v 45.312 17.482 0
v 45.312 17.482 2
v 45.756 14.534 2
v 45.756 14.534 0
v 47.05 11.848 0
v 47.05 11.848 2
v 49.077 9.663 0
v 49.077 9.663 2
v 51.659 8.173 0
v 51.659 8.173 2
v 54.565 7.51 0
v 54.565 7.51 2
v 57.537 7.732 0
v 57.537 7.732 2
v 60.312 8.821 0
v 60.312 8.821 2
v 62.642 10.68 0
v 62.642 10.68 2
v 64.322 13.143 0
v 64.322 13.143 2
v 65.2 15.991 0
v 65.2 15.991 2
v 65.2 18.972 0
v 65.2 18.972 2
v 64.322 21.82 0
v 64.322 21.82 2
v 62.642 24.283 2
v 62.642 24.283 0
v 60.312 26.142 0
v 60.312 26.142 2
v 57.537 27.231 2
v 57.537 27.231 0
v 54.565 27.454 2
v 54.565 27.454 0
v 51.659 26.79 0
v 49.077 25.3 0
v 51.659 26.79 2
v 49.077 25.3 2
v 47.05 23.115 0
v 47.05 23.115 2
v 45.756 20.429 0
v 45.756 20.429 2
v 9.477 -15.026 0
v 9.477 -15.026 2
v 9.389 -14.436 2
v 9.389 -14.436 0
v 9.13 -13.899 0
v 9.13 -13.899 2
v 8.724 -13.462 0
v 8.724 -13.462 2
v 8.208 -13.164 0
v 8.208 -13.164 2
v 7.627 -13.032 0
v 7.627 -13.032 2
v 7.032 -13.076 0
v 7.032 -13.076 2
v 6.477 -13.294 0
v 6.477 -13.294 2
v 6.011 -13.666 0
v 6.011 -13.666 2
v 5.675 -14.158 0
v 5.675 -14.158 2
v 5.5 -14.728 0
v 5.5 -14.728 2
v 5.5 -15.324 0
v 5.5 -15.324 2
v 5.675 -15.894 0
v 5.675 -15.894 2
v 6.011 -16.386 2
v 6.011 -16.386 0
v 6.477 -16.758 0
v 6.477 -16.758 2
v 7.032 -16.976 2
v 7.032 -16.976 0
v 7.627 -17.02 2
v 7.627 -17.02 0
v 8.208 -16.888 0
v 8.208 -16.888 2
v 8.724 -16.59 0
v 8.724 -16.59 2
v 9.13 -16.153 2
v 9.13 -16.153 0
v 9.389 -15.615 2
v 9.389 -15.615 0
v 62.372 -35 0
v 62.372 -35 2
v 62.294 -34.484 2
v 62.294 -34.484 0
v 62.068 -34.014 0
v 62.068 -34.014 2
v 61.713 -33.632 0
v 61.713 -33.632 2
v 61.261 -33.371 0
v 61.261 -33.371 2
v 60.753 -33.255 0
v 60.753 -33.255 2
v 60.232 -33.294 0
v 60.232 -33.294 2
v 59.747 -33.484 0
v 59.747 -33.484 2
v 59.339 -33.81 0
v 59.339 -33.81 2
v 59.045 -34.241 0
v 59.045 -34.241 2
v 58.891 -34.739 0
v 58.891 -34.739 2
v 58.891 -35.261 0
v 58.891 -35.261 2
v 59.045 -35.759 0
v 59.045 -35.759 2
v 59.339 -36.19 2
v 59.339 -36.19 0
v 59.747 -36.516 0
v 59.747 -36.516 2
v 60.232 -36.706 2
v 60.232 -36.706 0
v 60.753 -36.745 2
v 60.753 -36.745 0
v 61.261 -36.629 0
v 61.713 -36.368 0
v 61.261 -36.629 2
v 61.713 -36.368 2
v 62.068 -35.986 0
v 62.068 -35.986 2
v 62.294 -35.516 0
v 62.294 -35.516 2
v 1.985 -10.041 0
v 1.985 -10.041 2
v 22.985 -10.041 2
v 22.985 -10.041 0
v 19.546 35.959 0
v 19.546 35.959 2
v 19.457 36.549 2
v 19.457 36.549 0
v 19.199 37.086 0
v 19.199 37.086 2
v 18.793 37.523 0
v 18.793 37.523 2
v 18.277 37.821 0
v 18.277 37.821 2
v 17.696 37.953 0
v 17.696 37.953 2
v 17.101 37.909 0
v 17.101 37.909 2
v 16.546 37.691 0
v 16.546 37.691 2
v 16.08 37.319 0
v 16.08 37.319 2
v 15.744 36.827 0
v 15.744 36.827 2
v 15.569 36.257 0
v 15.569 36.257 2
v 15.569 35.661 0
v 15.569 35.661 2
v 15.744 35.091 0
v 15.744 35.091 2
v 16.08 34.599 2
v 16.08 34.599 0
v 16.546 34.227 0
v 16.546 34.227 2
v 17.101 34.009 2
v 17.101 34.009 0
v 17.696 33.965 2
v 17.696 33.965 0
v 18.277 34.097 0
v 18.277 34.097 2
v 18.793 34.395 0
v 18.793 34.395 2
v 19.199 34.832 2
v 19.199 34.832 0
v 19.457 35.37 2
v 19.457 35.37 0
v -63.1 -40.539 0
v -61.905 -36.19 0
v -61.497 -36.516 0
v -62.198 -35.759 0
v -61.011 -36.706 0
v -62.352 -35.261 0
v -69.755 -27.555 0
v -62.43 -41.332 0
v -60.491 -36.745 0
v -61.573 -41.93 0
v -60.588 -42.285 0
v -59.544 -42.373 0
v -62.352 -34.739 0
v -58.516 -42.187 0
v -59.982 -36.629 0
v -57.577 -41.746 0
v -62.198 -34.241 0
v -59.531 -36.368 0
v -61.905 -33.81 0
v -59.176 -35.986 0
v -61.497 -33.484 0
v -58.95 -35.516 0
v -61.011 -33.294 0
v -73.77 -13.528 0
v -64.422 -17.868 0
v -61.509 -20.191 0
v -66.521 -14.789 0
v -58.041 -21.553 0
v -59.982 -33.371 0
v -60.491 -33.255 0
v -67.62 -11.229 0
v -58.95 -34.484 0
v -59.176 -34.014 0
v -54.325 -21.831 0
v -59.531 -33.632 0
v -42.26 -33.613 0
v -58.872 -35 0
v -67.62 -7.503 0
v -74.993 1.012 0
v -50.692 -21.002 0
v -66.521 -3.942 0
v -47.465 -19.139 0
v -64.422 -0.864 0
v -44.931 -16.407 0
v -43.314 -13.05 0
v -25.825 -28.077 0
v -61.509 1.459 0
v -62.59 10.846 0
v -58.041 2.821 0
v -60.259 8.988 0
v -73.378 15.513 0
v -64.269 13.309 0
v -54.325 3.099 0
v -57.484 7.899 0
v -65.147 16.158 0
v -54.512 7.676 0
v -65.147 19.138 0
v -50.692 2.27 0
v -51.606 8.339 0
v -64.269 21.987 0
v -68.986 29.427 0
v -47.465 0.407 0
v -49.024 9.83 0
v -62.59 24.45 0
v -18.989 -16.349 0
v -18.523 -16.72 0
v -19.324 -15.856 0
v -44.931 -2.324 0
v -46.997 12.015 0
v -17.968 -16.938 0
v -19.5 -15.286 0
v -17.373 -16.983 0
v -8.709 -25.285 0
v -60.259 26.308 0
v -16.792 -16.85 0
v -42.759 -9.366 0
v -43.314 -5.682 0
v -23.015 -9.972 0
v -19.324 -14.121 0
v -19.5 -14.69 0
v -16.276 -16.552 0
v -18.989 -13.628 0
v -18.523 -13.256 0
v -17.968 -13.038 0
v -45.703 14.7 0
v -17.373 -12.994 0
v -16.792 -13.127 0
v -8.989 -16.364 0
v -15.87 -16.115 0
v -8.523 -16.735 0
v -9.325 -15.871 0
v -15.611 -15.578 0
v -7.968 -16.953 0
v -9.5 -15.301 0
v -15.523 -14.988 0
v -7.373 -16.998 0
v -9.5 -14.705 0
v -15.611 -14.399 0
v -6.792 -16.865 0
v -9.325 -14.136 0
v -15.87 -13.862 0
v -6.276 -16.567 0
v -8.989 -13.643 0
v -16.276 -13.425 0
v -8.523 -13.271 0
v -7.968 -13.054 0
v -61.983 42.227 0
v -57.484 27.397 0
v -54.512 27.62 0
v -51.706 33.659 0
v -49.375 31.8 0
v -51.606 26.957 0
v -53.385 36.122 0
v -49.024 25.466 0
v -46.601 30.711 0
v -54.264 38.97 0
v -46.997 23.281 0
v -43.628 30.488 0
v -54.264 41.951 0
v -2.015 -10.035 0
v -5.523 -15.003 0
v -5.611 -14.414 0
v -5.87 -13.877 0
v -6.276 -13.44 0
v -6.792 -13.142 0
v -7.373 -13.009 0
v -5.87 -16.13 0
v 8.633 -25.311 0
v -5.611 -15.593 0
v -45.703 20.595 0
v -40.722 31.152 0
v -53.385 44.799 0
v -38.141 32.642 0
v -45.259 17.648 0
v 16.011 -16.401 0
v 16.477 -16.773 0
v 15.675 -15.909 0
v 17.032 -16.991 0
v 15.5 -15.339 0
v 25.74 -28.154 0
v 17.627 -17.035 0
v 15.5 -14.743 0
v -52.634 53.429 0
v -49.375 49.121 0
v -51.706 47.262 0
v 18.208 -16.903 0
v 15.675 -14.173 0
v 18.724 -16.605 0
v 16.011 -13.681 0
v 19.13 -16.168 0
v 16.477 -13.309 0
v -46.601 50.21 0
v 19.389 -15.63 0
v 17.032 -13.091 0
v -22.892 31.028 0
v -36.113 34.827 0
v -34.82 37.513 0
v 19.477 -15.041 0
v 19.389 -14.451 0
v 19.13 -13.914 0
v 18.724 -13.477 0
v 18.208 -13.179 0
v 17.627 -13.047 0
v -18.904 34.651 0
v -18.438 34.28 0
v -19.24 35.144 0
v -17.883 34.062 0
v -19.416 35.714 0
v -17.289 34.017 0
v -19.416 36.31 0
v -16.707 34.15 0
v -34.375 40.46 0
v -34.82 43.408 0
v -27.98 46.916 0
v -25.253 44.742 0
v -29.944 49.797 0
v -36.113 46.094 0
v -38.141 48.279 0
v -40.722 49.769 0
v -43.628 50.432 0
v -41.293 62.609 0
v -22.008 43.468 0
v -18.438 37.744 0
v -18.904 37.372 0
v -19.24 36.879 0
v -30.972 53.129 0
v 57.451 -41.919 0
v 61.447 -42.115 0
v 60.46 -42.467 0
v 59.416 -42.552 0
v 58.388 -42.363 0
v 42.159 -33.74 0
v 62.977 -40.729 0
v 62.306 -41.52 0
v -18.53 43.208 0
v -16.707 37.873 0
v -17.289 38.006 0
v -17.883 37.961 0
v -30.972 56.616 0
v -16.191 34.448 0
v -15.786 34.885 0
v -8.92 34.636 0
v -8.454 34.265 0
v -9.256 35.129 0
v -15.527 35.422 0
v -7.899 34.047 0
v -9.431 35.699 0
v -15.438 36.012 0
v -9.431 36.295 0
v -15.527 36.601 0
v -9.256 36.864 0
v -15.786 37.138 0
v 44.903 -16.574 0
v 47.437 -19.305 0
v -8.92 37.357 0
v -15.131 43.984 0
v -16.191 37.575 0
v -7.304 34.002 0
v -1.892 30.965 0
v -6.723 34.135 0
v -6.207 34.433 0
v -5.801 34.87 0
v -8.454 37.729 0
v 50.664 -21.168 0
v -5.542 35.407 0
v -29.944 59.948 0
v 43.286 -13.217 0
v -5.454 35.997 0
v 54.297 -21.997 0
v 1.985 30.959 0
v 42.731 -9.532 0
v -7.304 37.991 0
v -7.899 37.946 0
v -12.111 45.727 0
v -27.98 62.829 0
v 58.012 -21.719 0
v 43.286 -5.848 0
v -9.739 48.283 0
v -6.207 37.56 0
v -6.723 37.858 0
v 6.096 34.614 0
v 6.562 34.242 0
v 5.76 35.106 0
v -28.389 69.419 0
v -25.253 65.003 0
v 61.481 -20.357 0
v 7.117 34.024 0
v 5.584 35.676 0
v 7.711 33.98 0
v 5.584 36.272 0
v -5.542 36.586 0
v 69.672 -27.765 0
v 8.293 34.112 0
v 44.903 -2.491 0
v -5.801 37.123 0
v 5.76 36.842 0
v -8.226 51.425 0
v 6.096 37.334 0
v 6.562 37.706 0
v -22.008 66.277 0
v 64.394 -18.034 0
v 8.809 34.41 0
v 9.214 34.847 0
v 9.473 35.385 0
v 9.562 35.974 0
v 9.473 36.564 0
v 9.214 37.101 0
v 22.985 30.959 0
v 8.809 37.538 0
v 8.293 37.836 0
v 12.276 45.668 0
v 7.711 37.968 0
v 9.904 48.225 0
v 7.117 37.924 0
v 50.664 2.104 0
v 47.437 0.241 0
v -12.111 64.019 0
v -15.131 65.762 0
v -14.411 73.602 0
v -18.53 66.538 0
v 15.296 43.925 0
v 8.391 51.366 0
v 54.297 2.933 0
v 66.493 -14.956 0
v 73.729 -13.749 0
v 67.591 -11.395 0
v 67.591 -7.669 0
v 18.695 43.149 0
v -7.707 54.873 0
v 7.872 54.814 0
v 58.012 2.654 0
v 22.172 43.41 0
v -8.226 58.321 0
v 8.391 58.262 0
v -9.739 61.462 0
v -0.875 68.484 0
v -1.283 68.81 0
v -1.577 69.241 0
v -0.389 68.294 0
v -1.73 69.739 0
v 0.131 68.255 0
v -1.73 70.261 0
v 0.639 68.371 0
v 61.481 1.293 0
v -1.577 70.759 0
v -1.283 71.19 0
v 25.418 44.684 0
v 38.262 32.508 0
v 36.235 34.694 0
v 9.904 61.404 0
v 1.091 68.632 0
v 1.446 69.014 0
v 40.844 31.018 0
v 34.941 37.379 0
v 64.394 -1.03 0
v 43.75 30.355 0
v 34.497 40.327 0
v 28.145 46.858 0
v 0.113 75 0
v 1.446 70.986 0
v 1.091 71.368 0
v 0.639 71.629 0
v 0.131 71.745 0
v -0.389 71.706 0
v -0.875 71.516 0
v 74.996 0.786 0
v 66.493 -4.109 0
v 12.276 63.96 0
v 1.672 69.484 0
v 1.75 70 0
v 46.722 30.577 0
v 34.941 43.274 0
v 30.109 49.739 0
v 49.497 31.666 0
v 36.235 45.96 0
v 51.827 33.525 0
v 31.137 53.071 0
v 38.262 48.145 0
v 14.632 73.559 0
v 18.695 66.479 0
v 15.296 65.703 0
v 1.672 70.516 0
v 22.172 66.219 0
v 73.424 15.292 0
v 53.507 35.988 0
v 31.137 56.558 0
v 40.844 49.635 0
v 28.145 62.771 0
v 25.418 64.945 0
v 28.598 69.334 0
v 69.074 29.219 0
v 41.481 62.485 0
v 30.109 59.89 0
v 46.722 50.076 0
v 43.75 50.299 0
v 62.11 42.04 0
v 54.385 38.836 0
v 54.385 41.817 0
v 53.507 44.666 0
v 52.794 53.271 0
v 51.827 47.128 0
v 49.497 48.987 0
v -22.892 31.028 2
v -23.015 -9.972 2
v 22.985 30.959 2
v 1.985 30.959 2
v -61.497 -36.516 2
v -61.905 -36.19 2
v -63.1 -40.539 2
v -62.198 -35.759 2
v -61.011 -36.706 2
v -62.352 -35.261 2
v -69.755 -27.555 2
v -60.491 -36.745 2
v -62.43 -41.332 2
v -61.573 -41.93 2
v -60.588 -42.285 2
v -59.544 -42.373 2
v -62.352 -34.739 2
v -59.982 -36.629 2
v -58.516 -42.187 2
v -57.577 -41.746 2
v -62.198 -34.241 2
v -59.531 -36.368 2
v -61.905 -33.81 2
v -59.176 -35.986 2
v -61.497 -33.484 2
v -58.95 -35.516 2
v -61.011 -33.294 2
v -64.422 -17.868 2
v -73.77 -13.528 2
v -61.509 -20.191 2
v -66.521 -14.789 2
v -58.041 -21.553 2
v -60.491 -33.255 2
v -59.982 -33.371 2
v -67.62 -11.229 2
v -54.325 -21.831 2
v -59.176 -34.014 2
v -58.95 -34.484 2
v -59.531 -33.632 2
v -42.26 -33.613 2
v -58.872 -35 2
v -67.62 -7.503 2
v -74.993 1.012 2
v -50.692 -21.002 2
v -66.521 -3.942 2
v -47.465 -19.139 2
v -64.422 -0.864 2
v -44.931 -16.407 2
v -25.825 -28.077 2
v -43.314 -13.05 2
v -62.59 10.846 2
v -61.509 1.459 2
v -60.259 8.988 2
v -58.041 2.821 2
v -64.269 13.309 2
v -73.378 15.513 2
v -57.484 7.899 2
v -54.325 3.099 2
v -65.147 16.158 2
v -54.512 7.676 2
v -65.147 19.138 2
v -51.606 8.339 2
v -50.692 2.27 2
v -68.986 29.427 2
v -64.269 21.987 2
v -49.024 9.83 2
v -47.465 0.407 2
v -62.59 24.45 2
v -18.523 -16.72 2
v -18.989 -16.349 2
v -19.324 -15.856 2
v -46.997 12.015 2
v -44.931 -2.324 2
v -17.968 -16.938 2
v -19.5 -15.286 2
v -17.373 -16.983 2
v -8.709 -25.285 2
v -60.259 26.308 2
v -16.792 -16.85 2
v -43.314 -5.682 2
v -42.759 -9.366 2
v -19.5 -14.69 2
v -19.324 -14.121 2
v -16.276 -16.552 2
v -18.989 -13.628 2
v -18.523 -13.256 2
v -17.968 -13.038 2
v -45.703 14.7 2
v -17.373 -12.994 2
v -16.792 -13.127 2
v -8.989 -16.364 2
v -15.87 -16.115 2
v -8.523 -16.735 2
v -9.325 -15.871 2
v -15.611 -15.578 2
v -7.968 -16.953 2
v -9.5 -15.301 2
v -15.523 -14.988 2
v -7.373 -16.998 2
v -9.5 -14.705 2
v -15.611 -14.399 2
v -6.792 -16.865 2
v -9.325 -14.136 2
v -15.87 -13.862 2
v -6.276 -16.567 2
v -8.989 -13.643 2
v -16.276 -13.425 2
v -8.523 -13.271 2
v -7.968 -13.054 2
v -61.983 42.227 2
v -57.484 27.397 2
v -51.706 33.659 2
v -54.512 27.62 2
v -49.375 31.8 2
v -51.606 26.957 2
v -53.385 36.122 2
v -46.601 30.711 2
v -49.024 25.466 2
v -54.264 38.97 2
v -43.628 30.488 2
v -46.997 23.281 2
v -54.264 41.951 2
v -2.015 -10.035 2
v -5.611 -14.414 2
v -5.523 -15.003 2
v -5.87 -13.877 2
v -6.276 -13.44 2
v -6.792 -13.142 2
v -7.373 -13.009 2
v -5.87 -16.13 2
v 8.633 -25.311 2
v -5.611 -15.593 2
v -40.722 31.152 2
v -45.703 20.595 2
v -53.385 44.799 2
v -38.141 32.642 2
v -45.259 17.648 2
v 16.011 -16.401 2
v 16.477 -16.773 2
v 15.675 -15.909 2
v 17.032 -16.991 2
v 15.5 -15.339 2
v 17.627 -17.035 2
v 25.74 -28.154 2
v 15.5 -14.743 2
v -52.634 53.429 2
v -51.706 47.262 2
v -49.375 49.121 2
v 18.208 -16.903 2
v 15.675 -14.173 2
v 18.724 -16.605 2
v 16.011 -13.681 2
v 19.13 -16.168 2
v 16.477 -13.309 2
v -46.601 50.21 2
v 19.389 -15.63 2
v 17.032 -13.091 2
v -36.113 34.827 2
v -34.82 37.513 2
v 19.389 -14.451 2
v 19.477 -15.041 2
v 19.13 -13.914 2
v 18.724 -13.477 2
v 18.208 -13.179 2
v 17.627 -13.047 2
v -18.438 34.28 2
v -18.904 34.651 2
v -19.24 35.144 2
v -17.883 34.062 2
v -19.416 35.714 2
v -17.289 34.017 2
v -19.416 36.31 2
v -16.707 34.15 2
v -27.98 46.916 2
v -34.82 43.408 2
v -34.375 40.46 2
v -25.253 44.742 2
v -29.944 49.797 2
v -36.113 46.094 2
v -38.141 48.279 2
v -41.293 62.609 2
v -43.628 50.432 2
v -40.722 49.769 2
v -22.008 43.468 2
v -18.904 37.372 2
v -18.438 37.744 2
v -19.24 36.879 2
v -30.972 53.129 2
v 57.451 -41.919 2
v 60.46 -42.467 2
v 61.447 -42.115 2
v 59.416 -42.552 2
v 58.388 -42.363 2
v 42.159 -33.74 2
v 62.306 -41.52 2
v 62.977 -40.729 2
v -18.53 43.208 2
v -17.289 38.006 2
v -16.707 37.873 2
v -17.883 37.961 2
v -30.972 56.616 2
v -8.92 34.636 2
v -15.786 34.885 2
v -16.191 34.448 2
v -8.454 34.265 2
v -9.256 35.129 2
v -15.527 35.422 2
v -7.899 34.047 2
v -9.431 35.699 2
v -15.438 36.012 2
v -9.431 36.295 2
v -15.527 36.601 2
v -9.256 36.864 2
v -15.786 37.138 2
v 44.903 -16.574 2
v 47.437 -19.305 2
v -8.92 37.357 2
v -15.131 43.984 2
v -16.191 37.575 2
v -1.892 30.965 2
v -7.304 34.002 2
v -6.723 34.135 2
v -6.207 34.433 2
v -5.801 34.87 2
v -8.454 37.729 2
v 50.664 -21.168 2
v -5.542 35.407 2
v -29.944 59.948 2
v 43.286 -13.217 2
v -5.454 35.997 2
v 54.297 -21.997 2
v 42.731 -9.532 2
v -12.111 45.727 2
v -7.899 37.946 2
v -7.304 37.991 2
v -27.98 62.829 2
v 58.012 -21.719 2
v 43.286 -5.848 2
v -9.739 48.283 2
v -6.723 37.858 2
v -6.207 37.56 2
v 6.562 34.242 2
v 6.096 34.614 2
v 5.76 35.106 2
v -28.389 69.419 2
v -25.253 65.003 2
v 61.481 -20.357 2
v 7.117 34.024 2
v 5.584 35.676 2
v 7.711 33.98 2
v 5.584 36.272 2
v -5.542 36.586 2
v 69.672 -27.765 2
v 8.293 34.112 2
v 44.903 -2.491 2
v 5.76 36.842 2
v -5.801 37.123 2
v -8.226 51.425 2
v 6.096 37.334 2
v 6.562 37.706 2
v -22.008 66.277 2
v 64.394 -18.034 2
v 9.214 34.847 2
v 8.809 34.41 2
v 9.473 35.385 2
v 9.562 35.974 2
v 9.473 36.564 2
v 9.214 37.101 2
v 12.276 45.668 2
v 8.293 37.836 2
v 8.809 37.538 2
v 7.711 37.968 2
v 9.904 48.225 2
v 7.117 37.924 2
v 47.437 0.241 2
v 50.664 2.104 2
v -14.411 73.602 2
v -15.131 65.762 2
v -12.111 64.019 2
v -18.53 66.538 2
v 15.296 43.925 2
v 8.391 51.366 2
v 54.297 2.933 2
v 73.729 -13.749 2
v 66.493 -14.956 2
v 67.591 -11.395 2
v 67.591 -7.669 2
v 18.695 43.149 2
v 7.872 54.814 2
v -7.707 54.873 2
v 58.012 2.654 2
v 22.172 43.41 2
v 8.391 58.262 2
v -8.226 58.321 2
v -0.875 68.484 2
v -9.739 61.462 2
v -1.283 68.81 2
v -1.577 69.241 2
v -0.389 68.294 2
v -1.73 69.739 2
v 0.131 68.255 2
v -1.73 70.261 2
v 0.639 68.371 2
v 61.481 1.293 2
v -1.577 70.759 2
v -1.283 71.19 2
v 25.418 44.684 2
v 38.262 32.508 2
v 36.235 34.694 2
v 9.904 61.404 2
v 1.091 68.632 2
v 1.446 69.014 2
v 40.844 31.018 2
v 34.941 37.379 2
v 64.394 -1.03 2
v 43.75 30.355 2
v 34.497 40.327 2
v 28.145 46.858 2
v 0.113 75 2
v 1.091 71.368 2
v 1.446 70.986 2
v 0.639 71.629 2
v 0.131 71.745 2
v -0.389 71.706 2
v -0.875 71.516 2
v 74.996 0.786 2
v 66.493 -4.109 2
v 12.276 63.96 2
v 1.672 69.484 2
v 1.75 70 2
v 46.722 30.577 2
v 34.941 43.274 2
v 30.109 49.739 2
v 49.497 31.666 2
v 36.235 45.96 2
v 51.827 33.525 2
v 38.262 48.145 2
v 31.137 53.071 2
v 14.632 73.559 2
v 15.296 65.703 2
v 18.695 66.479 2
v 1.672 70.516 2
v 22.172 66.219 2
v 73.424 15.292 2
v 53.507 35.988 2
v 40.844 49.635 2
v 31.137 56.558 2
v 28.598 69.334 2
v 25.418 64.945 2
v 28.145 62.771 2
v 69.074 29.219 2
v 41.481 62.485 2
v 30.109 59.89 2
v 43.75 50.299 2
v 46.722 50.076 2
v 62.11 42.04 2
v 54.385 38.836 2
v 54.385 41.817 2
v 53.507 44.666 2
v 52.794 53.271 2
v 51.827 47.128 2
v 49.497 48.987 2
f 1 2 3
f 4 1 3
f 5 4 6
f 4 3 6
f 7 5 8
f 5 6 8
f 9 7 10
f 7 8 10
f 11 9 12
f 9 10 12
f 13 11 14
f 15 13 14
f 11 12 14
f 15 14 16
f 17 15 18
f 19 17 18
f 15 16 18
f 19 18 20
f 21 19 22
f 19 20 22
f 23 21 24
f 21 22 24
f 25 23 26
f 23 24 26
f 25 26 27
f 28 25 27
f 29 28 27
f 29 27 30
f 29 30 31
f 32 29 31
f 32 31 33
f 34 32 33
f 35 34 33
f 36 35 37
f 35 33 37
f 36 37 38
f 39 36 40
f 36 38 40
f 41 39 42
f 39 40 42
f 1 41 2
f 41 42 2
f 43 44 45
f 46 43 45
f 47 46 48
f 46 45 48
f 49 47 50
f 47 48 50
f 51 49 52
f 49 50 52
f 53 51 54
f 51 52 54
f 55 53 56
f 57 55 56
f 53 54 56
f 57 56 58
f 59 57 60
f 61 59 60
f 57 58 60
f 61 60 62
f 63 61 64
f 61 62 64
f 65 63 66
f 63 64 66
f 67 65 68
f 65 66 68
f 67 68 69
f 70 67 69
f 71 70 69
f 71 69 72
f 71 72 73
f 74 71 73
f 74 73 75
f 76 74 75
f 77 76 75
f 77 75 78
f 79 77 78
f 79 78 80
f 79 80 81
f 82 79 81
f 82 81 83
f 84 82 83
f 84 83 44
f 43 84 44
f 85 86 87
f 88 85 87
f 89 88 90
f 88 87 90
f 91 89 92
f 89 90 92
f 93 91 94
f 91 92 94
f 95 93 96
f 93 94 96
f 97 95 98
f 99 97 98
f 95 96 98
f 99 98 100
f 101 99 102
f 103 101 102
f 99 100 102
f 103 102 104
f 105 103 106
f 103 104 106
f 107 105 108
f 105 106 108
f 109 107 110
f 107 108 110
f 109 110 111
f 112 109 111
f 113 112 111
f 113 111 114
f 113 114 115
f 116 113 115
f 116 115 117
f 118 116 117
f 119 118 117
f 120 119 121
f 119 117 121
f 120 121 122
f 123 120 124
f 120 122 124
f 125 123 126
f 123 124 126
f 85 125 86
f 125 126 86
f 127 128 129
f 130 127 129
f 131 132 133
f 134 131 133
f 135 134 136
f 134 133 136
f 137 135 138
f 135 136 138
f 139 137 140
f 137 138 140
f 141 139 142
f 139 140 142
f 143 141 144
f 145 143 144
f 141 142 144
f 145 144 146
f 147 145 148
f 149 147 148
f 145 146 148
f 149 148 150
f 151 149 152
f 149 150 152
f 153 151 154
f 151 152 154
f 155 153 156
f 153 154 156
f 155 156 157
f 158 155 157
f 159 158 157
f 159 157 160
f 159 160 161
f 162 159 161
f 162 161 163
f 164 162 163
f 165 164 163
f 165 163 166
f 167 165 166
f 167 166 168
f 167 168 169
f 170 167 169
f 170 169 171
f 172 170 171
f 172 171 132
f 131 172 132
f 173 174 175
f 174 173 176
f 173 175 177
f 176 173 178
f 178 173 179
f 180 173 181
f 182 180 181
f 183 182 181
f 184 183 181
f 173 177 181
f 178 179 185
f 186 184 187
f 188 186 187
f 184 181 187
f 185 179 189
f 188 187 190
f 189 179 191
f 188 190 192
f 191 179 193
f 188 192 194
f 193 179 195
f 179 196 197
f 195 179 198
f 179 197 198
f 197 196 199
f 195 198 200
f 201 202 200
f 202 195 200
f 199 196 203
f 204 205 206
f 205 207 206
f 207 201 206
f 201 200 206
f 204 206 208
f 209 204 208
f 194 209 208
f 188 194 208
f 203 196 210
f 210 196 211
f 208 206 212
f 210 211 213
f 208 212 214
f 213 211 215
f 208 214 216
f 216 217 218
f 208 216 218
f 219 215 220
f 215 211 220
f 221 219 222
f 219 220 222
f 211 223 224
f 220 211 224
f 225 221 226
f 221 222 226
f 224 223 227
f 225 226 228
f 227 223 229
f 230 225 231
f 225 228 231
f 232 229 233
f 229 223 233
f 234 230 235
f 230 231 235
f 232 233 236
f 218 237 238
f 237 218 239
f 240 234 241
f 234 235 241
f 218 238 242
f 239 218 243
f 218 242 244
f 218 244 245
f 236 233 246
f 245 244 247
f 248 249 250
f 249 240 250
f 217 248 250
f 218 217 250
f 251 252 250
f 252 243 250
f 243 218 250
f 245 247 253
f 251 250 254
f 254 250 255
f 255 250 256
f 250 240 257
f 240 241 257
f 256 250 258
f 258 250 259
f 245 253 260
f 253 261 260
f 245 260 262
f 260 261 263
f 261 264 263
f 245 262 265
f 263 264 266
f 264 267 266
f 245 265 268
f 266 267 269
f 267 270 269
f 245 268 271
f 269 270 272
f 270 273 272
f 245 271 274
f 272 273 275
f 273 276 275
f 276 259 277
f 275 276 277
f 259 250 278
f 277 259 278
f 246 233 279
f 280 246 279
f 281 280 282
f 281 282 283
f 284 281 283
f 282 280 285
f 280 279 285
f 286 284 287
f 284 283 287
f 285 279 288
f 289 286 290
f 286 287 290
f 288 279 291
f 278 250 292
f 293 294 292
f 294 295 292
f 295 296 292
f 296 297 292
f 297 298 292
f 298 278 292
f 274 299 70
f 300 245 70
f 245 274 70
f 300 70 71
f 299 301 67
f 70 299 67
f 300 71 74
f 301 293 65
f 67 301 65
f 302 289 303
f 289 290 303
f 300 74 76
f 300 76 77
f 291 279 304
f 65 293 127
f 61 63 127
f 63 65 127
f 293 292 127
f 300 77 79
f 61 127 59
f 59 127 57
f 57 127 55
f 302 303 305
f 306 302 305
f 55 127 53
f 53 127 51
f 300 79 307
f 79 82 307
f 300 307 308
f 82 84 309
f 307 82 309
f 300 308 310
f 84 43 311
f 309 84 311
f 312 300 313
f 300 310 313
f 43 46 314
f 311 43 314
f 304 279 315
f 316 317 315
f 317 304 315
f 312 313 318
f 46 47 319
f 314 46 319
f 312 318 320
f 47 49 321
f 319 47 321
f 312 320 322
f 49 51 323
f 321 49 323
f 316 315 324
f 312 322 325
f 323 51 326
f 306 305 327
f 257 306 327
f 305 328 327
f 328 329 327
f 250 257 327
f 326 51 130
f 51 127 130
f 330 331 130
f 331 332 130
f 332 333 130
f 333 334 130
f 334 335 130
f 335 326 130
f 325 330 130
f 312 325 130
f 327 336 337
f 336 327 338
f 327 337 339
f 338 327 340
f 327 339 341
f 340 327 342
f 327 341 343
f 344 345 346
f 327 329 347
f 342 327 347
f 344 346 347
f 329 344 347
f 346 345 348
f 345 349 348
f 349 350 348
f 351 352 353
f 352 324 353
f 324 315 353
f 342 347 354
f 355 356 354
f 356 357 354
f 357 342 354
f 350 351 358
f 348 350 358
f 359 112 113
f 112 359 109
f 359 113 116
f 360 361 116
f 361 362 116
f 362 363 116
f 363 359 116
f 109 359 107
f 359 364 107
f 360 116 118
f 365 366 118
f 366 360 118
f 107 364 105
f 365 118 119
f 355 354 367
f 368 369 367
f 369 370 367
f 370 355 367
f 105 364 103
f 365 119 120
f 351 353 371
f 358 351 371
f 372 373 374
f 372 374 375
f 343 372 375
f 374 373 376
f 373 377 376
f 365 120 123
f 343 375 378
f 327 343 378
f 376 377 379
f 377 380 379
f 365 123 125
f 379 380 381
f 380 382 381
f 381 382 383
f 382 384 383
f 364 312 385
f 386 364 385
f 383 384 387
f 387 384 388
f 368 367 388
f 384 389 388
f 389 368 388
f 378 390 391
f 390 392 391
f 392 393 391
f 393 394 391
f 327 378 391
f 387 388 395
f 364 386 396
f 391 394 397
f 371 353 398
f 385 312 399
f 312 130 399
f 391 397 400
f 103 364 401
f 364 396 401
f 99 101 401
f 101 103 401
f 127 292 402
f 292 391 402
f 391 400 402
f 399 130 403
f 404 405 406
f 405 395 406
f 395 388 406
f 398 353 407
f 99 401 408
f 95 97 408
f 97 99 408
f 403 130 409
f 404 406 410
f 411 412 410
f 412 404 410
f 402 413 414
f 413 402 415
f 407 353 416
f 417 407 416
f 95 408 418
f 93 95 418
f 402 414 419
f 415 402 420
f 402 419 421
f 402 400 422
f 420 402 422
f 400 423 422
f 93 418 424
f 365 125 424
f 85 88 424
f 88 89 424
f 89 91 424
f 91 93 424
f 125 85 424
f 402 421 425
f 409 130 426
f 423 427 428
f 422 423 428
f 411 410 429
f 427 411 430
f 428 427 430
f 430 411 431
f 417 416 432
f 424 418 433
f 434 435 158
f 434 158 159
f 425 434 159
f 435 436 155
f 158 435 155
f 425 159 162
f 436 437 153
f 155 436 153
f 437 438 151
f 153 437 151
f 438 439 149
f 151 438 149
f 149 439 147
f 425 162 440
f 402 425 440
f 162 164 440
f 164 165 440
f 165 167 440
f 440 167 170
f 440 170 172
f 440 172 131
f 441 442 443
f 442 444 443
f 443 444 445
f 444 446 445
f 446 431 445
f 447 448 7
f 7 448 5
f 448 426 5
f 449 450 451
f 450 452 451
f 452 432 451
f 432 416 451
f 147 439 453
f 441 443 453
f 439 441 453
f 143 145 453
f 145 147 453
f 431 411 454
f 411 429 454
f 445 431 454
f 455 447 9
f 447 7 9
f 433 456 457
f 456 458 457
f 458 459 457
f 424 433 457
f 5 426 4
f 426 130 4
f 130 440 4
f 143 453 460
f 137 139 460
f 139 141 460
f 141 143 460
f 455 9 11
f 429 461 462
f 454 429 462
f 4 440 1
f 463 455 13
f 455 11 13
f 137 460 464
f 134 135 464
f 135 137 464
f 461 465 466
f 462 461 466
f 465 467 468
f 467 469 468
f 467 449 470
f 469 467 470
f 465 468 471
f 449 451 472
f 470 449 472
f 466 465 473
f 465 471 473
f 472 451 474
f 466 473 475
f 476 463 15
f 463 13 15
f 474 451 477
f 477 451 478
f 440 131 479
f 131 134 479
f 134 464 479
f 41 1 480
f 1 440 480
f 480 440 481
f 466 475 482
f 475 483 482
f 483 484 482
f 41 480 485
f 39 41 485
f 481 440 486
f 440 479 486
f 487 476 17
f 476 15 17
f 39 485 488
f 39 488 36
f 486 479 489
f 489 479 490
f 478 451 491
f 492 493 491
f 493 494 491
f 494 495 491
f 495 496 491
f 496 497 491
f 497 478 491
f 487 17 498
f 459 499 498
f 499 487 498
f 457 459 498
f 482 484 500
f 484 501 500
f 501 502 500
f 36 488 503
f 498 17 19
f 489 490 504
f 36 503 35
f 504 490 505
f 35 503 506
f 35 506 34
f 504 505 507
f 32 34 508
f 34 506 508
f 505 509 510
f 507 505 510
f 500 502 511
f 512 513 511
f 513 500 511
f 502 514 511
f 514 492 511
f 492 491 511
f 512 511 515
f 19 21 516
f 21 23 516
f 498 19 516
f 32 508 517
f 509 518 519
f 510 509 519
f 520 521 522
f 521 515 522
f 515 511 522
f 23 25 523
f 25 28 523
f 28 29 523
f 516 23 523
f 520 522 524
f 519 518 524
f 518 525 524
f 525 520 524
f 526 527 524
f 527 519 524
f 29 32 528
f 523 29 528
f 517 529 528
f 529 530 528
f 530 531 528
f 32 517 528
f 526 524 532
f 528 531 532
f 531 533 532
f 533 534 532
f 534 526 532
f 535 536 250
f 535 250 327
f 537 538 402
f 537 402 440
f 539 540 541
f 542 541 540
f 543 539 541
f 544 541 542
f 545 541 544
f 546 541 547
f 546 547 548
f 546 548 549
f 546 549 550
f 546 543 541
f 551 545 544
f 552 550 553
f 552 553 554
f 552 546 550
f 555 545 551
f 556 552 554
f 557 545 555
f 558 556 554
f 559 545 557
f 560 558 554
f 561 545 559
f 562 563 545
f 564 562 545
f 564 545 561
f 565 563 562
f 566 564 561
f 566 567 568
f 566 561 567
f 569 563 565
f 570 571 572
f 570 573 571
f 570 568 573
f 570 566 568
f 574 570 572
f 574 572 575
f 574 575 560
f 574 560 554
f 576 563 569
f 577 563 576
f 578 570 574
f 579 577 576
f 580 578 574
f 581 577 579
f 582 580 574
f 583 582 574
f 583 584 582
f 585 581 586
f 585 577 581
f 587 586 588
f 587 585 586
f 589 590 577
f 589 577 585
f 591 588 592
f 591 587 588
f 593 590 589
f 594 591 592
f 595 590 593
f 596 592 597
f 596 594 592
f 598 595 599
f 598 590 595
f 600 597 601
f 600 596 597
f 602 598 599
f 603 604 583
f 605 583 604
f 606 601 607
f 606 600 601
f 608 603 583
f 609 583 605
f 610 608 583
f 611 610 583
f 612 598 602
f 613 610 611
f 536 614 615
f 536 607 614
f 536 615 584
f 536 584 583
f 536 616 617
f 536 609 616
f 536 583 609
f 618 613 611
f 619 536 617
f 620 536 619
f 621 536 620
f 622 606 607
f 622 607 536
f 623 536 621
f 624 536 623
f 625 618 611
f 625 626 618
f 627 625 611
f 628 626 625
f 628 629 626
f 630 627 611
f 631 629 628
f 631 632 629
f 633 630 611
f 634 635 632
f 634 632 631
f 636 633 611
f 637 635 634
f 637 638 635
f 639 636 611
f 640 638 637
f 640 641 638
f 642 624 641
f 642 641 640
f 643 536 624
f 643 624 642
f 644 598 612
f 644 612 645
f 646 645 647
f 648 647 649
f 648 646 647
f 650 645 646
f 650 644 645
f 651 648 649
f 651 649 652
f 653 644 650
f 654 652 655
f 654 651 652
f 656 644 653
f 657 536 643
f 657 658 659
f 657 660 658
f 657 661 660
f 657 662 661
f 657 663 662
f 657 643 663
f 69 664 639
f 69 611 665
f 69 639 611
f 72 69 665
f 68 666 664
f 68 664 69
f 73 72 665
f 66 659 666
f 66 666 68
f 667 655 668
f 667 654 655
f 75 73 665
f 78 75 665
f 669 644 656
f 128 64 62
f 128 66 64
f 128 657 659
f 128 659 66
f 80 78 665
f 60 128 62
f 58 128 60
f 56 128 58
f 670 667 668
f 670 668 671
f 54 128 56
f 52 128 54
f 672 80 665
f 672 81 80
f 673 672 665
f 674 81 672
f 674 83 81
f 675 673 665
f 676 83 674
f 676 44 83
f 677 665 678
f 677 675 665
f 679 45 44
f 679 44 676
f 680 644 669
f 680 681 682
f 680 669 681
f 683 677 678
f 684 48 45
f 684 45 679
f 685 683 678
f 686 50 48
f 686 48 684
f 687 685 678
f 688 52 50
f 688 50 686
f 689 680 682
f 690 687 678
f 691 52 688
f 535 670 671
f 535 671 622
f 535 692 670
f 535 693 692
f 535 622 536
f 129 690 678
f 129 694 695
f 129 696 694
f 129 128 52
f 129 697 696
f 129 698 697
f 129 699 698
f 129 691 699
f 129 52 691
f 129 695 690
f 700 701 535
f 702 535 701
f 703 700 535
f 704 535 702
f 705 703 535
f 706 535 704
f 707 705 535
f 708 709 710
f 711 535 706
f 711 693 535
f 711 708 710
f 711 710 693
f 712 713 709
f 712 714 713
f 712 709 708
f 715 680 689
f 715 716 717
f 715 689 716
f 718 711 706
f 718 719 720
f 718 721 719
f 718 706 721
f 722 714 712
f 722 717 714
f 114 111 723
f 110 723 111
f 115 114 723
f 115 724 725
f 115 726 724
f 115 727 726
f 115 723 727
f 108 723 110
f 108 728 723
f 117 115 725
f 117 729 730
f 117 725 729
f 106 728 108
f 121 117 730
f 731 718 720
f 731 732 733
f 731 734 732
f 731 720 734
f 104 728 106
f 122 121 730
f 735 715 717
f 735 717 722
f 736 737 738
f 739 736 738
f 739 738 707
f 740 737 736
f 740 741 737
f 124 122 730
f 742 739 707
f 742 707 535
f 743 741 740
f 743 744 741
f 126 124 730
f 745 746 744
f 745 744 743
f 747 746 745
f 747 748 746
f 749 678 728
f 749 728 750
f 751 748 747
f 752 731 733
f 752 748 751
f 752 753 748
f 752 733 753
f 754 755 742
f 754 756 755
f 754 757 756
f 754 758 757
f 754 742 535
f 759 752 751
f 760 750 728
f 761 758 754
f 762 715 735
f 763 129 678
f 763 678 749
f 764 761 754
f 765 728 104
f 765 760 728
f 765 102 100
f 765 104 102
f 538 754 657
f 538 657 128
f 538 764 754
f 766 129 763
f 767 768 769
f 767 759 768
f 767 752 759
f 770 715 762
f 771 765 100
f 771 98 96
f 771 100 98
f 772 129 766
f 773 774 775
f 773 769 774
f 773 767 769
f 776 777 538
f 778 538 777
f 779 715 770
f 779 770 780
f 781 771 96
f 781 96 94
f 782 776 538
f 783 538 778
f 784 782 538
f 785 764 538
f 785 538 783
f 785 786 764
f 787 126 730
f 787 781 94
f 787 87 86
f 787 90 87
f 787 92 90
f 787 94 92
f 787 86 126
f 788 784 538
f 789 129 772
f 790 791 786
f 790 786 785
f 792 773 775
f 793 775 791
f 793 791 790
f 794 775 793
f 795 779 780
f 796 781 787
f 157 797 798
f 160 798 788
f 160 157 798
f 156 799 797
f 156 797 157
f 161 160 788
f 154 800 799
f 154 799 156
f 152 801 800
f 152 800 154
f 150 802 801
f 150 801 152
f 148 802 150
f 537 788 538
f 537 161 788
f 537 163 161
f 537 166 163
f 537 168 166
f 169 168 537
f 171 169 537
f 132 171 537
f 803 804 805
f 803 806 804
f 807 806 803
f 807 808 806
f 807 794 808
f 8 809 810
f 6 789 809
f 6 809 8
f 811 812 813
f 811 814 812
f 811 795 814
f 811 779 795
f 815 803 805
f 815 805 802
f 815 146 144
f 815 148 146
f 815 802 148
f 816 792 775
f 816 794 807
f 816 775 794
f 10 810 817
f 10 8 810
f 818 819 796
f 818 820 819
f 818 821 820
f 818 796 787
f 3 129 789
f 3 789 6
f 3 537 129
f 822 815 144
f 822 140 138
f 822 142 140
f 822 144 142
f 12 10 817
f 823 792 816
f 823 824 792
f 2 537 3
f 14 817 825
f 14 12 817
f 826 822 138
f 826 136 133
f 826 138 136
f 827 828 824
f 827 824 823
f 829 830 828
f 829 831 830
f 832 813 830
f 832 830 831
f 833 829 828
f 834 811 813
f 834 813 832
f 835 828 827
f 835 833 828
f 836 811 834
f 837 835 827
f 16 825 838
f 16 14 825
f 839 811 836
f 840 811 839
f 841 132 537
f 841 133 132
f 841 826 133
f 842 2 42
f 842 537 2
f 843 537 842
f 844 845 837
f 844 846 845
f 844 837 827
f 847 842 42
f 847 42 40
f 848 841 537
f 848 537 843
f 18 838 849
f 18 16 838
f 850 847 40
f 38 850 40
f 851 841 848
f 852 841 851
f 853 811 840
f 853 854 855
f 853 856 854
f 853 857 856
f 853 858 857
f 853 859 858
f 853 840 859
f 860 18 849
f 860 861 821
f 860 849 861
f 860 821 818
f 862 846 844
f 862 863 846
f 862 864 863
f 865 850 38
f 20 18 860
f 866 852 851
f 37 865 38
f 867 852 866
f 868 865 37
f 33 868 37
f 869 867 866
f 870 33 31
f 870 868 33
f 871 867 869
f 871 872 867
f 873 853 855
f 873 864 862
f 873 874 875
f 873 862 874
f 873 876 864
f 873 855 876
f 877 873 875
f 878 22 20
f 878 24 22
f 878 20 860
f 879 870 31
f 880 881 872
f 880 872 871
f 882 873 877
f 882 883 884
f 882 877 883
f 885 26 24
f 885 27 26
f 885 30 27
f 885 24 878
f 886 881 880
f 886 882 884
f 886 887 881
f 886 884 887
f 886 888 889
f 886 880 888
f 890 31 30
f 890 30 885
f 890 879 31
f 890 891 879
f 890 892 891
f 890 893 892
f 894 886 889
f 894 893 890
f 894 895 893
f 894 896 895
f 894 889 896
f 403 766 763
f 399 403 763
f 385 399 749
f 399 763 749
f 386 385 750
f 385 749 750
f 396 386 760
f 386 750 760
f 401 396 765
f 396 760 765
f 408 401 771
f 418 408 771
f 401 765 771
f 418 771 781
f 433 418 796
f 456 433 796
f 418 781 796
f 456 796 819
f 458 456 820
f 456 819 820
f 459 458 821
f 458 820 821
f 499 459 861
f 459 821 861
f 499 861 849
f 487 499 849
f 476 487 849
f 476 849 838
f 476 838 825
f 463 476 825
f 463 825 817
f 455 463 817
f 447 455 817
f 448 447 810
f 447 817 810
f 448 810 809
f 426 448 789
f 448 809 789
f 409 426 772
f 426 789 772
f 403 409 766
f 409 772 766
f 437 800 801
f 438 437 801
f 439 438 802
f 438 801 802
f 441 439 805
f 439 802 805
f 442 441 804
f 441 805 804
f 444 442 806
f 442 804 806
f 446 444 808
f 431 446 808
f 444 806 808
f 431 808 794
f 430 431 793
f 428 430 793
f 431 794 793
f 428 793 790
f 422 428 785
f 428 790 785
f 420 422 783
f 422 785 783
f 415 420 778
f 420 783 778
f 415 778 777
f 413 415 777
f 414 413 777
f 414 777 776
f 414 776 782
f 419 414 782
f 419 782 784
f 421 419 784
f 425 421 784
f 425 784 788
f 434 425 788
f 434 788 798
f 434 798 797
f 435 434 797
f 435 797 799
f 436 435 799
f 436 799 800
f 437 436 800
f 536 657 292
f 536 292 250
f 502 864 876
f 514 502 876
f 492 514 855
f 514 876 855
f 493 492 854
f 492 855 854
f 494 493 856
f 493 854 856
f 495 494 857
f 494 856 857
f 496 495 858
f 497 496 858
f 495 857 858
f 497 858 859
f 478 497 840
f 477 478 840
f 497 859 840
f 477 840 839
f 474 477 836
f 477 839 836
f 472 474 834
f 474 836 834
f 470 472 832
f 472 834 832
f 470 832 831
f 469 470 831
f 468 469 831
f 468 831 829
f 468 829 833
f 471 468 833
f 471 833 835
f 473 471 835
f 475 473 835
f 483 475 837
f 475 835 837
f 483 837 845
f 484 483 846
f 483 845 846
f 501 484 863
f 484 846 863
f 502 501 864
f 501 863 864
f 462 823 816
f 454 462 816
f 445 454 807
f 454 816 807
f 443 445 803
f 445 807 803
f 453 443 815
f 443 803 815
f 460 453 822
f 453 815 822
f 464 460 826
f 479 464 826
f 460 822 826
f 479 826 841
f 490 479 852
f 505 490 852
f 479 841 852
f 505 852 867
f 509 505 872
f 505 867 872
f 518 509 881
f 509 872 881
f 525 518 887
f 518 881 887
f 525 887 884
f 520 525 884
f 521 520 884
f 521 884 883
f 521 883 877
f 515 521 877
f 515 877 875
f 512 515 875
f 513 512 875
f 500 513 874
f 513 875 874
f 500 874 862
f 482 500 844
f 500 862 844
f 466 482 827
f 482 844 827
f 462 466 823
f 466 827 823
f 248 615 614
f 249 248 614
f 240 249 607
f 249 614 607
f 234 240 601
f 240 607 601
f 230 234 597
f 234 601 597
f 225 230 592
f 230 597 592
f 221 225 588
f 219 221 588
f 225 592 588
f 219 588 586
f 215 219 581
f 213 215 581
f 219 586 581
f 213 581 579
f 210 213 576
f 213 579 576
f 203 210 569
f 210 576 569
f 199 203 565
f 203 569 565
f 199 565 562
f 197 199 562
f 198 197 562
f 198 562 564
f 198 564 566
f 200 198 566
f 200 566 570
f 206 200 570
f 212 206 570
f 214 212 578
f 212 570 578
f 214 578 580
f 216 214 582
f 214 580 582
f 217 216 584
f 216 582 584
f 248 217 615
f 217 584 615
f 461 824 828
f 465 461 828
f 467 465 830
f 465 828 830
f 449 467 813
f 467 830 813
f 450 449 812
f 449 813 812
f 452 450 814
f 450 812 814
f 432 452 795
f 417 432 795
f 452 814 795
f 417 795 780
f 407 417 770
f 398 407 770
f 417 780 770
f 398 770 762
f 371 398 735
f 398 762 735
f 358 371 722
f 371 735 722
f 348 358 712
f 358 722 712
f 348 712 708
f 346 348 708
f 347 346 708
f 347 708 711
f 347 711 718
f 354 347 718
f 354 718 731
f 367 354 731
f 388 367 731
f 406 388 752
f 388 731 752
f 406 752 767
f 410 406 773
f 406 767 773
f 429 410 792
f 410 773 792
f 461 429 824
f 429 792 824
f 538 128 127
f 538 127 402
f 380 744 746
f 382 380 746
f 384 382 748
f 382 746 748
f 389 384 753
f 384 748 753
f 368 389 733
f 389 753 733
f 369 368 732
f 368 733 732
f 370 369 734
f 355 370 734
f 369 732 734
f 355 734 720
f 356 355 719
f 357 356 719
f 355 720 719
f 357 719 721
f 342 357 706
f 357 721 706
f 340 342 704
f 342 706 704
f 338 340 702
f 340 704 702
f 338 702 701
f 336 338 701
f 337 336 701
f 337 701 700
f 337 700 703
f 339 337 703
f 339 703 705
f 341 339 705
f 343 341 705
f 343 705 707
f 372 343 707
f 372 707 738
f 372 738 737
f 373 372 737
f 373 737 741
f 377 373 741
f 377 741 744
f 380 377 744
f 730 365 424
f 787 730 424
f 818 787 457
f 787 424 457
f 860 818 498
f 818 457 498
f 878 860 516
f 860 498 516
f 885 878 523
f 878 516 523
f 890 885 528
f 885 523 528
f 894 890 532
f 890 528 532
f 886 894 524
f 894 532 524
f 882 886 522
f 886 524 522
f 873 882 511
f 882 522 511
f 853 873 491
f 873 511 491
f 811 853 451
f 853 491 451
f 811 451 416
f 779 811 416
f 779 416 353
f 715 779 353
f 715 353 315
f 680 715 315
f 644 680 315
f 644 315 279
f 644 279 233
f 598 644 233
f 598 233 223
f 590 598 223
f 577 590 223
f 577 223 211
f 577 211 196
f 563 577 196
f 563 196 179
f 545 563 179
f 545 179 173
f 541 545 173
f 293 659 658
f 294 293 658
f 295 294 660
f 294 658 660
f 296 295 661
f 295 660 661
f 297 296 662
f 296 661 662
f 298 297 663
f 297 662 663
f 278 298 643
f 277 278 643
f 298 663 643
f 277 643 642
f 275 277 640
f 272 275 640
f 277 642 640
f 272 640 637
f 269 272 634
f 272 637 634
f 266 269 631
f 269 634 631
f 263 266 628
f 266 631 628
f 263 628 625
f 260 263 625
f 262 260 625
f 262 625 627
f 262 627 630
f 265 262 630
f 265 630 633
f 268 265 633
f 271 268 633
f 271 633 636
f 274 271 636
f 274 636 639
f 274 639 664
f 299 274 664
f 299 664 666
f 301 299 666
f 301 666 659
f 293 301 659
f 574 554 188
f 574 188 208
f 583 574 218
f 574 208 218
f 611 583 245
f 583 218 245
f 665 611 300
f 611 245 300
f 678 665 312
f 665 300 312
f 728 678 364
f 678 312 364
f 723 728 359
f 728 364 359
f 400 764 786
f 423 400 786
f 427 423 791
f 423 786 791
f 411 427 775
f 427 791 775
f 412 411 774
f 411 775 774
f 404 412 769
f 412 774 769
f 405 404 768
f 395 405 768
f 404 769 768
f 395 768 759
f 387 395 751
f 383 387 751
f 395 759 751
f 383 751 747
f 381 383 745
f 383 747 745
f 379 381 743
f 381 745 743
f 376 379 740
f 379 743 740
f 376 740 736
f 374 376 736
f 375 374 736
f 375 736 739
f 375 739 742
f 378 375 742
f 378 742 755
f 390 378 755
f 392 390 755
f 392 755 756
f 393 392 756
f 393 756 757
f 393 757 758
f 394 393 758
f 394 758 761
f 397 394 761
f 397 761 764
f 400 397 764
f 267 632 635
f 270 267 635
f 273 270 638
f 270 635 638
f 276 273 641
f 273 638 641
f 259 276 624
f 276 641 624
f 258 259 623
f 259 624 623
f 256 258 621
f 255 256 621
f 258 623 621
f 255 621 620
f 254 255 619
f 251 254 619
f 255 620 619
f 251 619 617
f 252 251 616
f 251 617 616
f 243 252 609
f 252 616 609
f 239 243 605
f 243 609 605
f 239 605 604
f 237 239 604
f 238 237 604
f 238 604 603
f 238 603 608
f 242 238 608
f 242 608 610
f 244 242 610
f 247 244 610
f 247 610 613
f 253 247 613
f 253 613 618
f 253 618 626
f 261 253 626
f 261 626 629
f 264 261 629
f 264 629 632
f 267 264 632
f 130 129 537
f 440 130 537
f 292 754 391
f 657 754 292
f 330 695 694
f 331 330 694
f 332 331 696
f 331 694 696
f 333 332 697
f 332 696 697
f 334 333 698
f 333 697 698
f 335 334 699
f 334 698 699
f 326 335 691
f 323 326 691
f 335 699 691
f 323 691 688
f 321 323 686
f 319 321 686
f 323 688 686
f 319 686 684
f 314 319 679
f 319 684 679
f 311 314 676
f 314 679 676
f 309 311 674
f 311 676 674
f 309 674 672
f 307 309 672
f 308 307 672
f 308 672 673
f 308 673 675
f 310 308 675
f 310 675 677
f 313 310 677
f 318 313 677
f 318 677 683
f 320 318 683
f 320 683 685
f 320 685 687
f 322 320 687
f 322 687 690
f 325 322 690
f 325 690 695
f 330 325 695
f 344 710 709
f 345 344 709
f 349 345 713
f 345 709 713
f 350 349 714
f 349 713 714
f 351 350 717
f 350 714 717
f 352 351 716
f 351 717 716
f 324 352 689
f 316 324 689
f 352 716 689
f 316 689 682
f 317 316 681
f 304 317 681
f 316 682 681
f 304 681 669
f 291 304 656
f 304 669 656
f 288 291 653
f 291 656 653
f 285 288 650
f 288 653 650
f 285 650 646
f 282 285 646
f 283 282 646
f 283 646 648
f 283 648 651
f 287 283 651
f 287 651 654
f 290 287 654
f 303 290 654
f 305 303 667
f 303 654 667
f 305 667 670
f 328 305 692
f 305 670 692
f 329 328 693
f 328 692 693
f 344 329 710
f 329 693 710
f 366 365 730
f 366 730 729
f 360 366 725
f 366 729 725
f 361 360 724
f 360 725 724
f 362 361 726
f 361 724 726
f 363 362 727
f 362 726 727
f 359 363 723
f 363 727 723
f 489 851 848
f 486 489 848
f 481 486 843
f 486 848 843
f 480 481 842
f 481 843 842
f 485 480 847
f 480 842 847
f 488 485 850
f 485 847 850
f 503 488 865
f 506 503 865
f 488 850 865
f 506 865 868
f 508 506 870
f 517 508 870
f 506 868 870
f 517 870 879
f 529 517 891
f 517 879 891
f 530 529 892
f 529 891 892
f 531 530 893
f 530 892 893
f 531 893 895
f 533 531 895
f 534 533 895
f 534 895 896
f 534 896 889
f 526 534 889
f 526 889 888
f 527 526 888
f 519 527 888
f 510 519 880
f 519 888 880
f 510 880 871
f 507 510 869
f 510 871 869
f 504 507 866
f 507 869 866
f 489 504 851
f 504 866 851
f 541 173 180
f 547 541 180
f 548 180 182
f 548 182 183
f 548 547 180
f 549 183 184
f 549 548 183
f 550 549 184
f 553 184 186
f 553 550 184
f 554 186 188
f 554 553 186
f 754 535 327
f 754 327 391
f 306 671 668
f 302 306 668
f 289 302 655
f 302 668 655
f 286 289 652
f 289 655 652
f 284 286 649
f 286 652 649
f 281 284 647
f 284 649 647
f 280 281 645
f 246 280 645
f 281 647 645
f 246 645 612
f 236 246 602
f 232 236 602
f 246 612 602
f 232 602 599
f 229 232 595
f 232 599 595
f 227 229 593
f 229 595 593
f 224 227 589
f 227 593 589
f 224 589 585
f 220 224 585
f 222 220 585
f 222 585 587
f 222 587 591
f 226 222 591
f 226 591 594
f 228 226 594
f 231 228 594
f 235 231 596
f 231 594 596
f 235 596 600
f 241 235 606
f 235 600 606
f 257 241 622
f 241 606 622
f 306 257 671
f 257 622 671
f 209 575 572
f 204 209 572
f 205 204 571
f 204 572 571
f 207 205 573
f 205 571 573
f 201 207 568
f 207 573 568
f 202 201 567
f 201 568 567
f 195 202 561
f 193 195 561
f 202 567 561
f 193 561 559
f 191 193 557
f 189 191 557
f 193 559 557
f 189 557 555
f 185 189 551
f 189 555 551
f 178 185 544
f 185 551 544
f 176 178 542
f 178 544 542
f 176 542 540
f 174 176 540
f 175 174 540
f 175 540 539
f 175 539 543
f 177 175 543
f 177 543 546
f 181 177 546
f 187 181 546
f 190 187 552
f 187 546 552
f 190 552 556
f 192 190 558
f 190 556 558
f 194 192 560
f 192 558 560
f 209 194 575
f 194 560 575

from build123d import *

# Parameters (mm, degrees)
EPAISSEUR_PLAQUE_DEPTH          = 2
ESQUISSE5_R                     = 1.75
PERCAGE_FIS_FIXATIONS_DEPTH     = 2
ARRONDIS_EXTREMITES_R           = 4
ESQUISSE10_R                    = 10
ESQUISSE10_R_2                  = 12.5
ESQUISSE10_R_3                  = 11.697835519
EVIDEMENT_DE_MATI_RE_DEPTH      = 2
ESQUISSE11_W                    = 21
ESQUISSE11_H                    = 41
ESQUISSE11_R                    = 2
EMPLACEMENTS_SERVOMOTEURS_DEPTH = 10


with BuildPart() as part:
    # Esquisse3 → Epaisseur plaque (new body)
    with BuildSketch(Plane.XY):
        with BuildLine():
            ThreePointArc((60.676831069, -44.083127967), (0.112789047, 74.999915191), (-60.809145642, -43.900430594))
            ThreePointArc((-60.809145642, -43.900430594), (-0.037511568, -24.943596323), (60.676831069, -44.083127967))
        make_face()
    extrude(amount=EPAISSEUR_PLAQUE_DEPTH)

    # Esquisse5 → Percage fis fixations (cut)
    with BuildSketch(Plane.XY.offset(2)):
        with Locations((0, 70)):
            Circle(ESQUISSE5_R)
        with Locations((60.621778265, -35)):
            Circle(ESQUISSE5_R)
        with Locations((-60.621778265, -35)):
            Circle(ESQUISSE5_R)
    extrude(amount=-PERCAGE_FIS_FIXATIONS_DEPTH, mode=Mode.SUBTRACT)

    # Arrondis extremites
    arrondis_extremites_edges = [part.edges().sort_by_distance(p)[0] for p in [
        (-60.809145642, -43.900430594, 1),
        (60.676831069, -44.083127967, 1),
    ]]
    fillet(arrondis_extremites_edges, radius=ARRONDIS_EXTREMITES_R)

    # Esquisse10 → Evidement de matière (cut)
    with BuildSketch(Plane.XY.offset(2)):
        with Locations((-44.375477733, 40.460370332)):
            Circle(ESQUISSE10_R)
        with Locations((-55.259118801, 17.647943075)):
            Circle(ESQUISSE10_R)
        with Locations((-55.259118801, -9.36594672)):
            Circle(ESQUISSE10_R_2)
        with Locations(Location((55.230698855, -9.532107458, 0), (0, 0, 180))):
            Circle(ESQUISSE10_R_2)
        with Locations(Location((55.311948653, 17.481660149, 0), (0, 0, 180))):
            Circle(ESQUISSE10_R)
        with Locations(Location((44.496969854, 40.326718999, 0), (0, 0, 180))):
            Circle(ESQUISSE10_R)
        with Locations((-19.404495621, 54.872818382)):
            Circle(ESQUISSE10_R_3)
        with Locations(Location((19.569449075, 54.814207195, 0), (0, 0, 180))):
            Circle(ESQUISSE10_R_3)
    extrude(amount=-EVIDEMENT_DE_MATI_RE_DEPTH, mode=Mode.SUBTRACT)

    # Esquisse11 → Emplacements servomoteurs (cut)
    with BuildSketch(Plane.XY.offset(2)):
        Polygon((-1.891789392, 30.96484727), (-2.015105277, -10.03496728), (-23.015010291, -9.971805486), (-22.891694406, 31.028009065), align=None)
        with Locations((12.484913946, 10.459017268)):
            Rectangle(ESQUISSE11_W, ESQUISSE11_H)
        with Locations((7.56186672, 35.974032472)):
            Circle(ESQUISSE11_R)
        with Locations((17.546338474, 35.959017268)):
            Circle(ESQUISSE11_R)
        with Locations((-7.453633256, 35.996613617)):
            Circle(ESQUISSE11_R)
        with Locations((-17.438105011, 36.011628821)):
            Circle(ESQUISSE11_R)
        with Locations((-17.522560101, -14.988347843)):
            Circle(ESQUISSE11_R)
        with Locations((17.477400322, -15.040982732)):
            Circle(ESQUISSE11_R)
        with Locations((7.47741163, -15.025944192)):
            Circle(ESQUISSE11_R)
        with Locations((-7.522571408, -15.003386383)):
            Circle(ESQUISSE11_R)
    extrude(amount=-EMPLACEMENTS_SERVOMOTEURS_DEPTH, mode=Mode.SUBTRACT)


solid = part.part
